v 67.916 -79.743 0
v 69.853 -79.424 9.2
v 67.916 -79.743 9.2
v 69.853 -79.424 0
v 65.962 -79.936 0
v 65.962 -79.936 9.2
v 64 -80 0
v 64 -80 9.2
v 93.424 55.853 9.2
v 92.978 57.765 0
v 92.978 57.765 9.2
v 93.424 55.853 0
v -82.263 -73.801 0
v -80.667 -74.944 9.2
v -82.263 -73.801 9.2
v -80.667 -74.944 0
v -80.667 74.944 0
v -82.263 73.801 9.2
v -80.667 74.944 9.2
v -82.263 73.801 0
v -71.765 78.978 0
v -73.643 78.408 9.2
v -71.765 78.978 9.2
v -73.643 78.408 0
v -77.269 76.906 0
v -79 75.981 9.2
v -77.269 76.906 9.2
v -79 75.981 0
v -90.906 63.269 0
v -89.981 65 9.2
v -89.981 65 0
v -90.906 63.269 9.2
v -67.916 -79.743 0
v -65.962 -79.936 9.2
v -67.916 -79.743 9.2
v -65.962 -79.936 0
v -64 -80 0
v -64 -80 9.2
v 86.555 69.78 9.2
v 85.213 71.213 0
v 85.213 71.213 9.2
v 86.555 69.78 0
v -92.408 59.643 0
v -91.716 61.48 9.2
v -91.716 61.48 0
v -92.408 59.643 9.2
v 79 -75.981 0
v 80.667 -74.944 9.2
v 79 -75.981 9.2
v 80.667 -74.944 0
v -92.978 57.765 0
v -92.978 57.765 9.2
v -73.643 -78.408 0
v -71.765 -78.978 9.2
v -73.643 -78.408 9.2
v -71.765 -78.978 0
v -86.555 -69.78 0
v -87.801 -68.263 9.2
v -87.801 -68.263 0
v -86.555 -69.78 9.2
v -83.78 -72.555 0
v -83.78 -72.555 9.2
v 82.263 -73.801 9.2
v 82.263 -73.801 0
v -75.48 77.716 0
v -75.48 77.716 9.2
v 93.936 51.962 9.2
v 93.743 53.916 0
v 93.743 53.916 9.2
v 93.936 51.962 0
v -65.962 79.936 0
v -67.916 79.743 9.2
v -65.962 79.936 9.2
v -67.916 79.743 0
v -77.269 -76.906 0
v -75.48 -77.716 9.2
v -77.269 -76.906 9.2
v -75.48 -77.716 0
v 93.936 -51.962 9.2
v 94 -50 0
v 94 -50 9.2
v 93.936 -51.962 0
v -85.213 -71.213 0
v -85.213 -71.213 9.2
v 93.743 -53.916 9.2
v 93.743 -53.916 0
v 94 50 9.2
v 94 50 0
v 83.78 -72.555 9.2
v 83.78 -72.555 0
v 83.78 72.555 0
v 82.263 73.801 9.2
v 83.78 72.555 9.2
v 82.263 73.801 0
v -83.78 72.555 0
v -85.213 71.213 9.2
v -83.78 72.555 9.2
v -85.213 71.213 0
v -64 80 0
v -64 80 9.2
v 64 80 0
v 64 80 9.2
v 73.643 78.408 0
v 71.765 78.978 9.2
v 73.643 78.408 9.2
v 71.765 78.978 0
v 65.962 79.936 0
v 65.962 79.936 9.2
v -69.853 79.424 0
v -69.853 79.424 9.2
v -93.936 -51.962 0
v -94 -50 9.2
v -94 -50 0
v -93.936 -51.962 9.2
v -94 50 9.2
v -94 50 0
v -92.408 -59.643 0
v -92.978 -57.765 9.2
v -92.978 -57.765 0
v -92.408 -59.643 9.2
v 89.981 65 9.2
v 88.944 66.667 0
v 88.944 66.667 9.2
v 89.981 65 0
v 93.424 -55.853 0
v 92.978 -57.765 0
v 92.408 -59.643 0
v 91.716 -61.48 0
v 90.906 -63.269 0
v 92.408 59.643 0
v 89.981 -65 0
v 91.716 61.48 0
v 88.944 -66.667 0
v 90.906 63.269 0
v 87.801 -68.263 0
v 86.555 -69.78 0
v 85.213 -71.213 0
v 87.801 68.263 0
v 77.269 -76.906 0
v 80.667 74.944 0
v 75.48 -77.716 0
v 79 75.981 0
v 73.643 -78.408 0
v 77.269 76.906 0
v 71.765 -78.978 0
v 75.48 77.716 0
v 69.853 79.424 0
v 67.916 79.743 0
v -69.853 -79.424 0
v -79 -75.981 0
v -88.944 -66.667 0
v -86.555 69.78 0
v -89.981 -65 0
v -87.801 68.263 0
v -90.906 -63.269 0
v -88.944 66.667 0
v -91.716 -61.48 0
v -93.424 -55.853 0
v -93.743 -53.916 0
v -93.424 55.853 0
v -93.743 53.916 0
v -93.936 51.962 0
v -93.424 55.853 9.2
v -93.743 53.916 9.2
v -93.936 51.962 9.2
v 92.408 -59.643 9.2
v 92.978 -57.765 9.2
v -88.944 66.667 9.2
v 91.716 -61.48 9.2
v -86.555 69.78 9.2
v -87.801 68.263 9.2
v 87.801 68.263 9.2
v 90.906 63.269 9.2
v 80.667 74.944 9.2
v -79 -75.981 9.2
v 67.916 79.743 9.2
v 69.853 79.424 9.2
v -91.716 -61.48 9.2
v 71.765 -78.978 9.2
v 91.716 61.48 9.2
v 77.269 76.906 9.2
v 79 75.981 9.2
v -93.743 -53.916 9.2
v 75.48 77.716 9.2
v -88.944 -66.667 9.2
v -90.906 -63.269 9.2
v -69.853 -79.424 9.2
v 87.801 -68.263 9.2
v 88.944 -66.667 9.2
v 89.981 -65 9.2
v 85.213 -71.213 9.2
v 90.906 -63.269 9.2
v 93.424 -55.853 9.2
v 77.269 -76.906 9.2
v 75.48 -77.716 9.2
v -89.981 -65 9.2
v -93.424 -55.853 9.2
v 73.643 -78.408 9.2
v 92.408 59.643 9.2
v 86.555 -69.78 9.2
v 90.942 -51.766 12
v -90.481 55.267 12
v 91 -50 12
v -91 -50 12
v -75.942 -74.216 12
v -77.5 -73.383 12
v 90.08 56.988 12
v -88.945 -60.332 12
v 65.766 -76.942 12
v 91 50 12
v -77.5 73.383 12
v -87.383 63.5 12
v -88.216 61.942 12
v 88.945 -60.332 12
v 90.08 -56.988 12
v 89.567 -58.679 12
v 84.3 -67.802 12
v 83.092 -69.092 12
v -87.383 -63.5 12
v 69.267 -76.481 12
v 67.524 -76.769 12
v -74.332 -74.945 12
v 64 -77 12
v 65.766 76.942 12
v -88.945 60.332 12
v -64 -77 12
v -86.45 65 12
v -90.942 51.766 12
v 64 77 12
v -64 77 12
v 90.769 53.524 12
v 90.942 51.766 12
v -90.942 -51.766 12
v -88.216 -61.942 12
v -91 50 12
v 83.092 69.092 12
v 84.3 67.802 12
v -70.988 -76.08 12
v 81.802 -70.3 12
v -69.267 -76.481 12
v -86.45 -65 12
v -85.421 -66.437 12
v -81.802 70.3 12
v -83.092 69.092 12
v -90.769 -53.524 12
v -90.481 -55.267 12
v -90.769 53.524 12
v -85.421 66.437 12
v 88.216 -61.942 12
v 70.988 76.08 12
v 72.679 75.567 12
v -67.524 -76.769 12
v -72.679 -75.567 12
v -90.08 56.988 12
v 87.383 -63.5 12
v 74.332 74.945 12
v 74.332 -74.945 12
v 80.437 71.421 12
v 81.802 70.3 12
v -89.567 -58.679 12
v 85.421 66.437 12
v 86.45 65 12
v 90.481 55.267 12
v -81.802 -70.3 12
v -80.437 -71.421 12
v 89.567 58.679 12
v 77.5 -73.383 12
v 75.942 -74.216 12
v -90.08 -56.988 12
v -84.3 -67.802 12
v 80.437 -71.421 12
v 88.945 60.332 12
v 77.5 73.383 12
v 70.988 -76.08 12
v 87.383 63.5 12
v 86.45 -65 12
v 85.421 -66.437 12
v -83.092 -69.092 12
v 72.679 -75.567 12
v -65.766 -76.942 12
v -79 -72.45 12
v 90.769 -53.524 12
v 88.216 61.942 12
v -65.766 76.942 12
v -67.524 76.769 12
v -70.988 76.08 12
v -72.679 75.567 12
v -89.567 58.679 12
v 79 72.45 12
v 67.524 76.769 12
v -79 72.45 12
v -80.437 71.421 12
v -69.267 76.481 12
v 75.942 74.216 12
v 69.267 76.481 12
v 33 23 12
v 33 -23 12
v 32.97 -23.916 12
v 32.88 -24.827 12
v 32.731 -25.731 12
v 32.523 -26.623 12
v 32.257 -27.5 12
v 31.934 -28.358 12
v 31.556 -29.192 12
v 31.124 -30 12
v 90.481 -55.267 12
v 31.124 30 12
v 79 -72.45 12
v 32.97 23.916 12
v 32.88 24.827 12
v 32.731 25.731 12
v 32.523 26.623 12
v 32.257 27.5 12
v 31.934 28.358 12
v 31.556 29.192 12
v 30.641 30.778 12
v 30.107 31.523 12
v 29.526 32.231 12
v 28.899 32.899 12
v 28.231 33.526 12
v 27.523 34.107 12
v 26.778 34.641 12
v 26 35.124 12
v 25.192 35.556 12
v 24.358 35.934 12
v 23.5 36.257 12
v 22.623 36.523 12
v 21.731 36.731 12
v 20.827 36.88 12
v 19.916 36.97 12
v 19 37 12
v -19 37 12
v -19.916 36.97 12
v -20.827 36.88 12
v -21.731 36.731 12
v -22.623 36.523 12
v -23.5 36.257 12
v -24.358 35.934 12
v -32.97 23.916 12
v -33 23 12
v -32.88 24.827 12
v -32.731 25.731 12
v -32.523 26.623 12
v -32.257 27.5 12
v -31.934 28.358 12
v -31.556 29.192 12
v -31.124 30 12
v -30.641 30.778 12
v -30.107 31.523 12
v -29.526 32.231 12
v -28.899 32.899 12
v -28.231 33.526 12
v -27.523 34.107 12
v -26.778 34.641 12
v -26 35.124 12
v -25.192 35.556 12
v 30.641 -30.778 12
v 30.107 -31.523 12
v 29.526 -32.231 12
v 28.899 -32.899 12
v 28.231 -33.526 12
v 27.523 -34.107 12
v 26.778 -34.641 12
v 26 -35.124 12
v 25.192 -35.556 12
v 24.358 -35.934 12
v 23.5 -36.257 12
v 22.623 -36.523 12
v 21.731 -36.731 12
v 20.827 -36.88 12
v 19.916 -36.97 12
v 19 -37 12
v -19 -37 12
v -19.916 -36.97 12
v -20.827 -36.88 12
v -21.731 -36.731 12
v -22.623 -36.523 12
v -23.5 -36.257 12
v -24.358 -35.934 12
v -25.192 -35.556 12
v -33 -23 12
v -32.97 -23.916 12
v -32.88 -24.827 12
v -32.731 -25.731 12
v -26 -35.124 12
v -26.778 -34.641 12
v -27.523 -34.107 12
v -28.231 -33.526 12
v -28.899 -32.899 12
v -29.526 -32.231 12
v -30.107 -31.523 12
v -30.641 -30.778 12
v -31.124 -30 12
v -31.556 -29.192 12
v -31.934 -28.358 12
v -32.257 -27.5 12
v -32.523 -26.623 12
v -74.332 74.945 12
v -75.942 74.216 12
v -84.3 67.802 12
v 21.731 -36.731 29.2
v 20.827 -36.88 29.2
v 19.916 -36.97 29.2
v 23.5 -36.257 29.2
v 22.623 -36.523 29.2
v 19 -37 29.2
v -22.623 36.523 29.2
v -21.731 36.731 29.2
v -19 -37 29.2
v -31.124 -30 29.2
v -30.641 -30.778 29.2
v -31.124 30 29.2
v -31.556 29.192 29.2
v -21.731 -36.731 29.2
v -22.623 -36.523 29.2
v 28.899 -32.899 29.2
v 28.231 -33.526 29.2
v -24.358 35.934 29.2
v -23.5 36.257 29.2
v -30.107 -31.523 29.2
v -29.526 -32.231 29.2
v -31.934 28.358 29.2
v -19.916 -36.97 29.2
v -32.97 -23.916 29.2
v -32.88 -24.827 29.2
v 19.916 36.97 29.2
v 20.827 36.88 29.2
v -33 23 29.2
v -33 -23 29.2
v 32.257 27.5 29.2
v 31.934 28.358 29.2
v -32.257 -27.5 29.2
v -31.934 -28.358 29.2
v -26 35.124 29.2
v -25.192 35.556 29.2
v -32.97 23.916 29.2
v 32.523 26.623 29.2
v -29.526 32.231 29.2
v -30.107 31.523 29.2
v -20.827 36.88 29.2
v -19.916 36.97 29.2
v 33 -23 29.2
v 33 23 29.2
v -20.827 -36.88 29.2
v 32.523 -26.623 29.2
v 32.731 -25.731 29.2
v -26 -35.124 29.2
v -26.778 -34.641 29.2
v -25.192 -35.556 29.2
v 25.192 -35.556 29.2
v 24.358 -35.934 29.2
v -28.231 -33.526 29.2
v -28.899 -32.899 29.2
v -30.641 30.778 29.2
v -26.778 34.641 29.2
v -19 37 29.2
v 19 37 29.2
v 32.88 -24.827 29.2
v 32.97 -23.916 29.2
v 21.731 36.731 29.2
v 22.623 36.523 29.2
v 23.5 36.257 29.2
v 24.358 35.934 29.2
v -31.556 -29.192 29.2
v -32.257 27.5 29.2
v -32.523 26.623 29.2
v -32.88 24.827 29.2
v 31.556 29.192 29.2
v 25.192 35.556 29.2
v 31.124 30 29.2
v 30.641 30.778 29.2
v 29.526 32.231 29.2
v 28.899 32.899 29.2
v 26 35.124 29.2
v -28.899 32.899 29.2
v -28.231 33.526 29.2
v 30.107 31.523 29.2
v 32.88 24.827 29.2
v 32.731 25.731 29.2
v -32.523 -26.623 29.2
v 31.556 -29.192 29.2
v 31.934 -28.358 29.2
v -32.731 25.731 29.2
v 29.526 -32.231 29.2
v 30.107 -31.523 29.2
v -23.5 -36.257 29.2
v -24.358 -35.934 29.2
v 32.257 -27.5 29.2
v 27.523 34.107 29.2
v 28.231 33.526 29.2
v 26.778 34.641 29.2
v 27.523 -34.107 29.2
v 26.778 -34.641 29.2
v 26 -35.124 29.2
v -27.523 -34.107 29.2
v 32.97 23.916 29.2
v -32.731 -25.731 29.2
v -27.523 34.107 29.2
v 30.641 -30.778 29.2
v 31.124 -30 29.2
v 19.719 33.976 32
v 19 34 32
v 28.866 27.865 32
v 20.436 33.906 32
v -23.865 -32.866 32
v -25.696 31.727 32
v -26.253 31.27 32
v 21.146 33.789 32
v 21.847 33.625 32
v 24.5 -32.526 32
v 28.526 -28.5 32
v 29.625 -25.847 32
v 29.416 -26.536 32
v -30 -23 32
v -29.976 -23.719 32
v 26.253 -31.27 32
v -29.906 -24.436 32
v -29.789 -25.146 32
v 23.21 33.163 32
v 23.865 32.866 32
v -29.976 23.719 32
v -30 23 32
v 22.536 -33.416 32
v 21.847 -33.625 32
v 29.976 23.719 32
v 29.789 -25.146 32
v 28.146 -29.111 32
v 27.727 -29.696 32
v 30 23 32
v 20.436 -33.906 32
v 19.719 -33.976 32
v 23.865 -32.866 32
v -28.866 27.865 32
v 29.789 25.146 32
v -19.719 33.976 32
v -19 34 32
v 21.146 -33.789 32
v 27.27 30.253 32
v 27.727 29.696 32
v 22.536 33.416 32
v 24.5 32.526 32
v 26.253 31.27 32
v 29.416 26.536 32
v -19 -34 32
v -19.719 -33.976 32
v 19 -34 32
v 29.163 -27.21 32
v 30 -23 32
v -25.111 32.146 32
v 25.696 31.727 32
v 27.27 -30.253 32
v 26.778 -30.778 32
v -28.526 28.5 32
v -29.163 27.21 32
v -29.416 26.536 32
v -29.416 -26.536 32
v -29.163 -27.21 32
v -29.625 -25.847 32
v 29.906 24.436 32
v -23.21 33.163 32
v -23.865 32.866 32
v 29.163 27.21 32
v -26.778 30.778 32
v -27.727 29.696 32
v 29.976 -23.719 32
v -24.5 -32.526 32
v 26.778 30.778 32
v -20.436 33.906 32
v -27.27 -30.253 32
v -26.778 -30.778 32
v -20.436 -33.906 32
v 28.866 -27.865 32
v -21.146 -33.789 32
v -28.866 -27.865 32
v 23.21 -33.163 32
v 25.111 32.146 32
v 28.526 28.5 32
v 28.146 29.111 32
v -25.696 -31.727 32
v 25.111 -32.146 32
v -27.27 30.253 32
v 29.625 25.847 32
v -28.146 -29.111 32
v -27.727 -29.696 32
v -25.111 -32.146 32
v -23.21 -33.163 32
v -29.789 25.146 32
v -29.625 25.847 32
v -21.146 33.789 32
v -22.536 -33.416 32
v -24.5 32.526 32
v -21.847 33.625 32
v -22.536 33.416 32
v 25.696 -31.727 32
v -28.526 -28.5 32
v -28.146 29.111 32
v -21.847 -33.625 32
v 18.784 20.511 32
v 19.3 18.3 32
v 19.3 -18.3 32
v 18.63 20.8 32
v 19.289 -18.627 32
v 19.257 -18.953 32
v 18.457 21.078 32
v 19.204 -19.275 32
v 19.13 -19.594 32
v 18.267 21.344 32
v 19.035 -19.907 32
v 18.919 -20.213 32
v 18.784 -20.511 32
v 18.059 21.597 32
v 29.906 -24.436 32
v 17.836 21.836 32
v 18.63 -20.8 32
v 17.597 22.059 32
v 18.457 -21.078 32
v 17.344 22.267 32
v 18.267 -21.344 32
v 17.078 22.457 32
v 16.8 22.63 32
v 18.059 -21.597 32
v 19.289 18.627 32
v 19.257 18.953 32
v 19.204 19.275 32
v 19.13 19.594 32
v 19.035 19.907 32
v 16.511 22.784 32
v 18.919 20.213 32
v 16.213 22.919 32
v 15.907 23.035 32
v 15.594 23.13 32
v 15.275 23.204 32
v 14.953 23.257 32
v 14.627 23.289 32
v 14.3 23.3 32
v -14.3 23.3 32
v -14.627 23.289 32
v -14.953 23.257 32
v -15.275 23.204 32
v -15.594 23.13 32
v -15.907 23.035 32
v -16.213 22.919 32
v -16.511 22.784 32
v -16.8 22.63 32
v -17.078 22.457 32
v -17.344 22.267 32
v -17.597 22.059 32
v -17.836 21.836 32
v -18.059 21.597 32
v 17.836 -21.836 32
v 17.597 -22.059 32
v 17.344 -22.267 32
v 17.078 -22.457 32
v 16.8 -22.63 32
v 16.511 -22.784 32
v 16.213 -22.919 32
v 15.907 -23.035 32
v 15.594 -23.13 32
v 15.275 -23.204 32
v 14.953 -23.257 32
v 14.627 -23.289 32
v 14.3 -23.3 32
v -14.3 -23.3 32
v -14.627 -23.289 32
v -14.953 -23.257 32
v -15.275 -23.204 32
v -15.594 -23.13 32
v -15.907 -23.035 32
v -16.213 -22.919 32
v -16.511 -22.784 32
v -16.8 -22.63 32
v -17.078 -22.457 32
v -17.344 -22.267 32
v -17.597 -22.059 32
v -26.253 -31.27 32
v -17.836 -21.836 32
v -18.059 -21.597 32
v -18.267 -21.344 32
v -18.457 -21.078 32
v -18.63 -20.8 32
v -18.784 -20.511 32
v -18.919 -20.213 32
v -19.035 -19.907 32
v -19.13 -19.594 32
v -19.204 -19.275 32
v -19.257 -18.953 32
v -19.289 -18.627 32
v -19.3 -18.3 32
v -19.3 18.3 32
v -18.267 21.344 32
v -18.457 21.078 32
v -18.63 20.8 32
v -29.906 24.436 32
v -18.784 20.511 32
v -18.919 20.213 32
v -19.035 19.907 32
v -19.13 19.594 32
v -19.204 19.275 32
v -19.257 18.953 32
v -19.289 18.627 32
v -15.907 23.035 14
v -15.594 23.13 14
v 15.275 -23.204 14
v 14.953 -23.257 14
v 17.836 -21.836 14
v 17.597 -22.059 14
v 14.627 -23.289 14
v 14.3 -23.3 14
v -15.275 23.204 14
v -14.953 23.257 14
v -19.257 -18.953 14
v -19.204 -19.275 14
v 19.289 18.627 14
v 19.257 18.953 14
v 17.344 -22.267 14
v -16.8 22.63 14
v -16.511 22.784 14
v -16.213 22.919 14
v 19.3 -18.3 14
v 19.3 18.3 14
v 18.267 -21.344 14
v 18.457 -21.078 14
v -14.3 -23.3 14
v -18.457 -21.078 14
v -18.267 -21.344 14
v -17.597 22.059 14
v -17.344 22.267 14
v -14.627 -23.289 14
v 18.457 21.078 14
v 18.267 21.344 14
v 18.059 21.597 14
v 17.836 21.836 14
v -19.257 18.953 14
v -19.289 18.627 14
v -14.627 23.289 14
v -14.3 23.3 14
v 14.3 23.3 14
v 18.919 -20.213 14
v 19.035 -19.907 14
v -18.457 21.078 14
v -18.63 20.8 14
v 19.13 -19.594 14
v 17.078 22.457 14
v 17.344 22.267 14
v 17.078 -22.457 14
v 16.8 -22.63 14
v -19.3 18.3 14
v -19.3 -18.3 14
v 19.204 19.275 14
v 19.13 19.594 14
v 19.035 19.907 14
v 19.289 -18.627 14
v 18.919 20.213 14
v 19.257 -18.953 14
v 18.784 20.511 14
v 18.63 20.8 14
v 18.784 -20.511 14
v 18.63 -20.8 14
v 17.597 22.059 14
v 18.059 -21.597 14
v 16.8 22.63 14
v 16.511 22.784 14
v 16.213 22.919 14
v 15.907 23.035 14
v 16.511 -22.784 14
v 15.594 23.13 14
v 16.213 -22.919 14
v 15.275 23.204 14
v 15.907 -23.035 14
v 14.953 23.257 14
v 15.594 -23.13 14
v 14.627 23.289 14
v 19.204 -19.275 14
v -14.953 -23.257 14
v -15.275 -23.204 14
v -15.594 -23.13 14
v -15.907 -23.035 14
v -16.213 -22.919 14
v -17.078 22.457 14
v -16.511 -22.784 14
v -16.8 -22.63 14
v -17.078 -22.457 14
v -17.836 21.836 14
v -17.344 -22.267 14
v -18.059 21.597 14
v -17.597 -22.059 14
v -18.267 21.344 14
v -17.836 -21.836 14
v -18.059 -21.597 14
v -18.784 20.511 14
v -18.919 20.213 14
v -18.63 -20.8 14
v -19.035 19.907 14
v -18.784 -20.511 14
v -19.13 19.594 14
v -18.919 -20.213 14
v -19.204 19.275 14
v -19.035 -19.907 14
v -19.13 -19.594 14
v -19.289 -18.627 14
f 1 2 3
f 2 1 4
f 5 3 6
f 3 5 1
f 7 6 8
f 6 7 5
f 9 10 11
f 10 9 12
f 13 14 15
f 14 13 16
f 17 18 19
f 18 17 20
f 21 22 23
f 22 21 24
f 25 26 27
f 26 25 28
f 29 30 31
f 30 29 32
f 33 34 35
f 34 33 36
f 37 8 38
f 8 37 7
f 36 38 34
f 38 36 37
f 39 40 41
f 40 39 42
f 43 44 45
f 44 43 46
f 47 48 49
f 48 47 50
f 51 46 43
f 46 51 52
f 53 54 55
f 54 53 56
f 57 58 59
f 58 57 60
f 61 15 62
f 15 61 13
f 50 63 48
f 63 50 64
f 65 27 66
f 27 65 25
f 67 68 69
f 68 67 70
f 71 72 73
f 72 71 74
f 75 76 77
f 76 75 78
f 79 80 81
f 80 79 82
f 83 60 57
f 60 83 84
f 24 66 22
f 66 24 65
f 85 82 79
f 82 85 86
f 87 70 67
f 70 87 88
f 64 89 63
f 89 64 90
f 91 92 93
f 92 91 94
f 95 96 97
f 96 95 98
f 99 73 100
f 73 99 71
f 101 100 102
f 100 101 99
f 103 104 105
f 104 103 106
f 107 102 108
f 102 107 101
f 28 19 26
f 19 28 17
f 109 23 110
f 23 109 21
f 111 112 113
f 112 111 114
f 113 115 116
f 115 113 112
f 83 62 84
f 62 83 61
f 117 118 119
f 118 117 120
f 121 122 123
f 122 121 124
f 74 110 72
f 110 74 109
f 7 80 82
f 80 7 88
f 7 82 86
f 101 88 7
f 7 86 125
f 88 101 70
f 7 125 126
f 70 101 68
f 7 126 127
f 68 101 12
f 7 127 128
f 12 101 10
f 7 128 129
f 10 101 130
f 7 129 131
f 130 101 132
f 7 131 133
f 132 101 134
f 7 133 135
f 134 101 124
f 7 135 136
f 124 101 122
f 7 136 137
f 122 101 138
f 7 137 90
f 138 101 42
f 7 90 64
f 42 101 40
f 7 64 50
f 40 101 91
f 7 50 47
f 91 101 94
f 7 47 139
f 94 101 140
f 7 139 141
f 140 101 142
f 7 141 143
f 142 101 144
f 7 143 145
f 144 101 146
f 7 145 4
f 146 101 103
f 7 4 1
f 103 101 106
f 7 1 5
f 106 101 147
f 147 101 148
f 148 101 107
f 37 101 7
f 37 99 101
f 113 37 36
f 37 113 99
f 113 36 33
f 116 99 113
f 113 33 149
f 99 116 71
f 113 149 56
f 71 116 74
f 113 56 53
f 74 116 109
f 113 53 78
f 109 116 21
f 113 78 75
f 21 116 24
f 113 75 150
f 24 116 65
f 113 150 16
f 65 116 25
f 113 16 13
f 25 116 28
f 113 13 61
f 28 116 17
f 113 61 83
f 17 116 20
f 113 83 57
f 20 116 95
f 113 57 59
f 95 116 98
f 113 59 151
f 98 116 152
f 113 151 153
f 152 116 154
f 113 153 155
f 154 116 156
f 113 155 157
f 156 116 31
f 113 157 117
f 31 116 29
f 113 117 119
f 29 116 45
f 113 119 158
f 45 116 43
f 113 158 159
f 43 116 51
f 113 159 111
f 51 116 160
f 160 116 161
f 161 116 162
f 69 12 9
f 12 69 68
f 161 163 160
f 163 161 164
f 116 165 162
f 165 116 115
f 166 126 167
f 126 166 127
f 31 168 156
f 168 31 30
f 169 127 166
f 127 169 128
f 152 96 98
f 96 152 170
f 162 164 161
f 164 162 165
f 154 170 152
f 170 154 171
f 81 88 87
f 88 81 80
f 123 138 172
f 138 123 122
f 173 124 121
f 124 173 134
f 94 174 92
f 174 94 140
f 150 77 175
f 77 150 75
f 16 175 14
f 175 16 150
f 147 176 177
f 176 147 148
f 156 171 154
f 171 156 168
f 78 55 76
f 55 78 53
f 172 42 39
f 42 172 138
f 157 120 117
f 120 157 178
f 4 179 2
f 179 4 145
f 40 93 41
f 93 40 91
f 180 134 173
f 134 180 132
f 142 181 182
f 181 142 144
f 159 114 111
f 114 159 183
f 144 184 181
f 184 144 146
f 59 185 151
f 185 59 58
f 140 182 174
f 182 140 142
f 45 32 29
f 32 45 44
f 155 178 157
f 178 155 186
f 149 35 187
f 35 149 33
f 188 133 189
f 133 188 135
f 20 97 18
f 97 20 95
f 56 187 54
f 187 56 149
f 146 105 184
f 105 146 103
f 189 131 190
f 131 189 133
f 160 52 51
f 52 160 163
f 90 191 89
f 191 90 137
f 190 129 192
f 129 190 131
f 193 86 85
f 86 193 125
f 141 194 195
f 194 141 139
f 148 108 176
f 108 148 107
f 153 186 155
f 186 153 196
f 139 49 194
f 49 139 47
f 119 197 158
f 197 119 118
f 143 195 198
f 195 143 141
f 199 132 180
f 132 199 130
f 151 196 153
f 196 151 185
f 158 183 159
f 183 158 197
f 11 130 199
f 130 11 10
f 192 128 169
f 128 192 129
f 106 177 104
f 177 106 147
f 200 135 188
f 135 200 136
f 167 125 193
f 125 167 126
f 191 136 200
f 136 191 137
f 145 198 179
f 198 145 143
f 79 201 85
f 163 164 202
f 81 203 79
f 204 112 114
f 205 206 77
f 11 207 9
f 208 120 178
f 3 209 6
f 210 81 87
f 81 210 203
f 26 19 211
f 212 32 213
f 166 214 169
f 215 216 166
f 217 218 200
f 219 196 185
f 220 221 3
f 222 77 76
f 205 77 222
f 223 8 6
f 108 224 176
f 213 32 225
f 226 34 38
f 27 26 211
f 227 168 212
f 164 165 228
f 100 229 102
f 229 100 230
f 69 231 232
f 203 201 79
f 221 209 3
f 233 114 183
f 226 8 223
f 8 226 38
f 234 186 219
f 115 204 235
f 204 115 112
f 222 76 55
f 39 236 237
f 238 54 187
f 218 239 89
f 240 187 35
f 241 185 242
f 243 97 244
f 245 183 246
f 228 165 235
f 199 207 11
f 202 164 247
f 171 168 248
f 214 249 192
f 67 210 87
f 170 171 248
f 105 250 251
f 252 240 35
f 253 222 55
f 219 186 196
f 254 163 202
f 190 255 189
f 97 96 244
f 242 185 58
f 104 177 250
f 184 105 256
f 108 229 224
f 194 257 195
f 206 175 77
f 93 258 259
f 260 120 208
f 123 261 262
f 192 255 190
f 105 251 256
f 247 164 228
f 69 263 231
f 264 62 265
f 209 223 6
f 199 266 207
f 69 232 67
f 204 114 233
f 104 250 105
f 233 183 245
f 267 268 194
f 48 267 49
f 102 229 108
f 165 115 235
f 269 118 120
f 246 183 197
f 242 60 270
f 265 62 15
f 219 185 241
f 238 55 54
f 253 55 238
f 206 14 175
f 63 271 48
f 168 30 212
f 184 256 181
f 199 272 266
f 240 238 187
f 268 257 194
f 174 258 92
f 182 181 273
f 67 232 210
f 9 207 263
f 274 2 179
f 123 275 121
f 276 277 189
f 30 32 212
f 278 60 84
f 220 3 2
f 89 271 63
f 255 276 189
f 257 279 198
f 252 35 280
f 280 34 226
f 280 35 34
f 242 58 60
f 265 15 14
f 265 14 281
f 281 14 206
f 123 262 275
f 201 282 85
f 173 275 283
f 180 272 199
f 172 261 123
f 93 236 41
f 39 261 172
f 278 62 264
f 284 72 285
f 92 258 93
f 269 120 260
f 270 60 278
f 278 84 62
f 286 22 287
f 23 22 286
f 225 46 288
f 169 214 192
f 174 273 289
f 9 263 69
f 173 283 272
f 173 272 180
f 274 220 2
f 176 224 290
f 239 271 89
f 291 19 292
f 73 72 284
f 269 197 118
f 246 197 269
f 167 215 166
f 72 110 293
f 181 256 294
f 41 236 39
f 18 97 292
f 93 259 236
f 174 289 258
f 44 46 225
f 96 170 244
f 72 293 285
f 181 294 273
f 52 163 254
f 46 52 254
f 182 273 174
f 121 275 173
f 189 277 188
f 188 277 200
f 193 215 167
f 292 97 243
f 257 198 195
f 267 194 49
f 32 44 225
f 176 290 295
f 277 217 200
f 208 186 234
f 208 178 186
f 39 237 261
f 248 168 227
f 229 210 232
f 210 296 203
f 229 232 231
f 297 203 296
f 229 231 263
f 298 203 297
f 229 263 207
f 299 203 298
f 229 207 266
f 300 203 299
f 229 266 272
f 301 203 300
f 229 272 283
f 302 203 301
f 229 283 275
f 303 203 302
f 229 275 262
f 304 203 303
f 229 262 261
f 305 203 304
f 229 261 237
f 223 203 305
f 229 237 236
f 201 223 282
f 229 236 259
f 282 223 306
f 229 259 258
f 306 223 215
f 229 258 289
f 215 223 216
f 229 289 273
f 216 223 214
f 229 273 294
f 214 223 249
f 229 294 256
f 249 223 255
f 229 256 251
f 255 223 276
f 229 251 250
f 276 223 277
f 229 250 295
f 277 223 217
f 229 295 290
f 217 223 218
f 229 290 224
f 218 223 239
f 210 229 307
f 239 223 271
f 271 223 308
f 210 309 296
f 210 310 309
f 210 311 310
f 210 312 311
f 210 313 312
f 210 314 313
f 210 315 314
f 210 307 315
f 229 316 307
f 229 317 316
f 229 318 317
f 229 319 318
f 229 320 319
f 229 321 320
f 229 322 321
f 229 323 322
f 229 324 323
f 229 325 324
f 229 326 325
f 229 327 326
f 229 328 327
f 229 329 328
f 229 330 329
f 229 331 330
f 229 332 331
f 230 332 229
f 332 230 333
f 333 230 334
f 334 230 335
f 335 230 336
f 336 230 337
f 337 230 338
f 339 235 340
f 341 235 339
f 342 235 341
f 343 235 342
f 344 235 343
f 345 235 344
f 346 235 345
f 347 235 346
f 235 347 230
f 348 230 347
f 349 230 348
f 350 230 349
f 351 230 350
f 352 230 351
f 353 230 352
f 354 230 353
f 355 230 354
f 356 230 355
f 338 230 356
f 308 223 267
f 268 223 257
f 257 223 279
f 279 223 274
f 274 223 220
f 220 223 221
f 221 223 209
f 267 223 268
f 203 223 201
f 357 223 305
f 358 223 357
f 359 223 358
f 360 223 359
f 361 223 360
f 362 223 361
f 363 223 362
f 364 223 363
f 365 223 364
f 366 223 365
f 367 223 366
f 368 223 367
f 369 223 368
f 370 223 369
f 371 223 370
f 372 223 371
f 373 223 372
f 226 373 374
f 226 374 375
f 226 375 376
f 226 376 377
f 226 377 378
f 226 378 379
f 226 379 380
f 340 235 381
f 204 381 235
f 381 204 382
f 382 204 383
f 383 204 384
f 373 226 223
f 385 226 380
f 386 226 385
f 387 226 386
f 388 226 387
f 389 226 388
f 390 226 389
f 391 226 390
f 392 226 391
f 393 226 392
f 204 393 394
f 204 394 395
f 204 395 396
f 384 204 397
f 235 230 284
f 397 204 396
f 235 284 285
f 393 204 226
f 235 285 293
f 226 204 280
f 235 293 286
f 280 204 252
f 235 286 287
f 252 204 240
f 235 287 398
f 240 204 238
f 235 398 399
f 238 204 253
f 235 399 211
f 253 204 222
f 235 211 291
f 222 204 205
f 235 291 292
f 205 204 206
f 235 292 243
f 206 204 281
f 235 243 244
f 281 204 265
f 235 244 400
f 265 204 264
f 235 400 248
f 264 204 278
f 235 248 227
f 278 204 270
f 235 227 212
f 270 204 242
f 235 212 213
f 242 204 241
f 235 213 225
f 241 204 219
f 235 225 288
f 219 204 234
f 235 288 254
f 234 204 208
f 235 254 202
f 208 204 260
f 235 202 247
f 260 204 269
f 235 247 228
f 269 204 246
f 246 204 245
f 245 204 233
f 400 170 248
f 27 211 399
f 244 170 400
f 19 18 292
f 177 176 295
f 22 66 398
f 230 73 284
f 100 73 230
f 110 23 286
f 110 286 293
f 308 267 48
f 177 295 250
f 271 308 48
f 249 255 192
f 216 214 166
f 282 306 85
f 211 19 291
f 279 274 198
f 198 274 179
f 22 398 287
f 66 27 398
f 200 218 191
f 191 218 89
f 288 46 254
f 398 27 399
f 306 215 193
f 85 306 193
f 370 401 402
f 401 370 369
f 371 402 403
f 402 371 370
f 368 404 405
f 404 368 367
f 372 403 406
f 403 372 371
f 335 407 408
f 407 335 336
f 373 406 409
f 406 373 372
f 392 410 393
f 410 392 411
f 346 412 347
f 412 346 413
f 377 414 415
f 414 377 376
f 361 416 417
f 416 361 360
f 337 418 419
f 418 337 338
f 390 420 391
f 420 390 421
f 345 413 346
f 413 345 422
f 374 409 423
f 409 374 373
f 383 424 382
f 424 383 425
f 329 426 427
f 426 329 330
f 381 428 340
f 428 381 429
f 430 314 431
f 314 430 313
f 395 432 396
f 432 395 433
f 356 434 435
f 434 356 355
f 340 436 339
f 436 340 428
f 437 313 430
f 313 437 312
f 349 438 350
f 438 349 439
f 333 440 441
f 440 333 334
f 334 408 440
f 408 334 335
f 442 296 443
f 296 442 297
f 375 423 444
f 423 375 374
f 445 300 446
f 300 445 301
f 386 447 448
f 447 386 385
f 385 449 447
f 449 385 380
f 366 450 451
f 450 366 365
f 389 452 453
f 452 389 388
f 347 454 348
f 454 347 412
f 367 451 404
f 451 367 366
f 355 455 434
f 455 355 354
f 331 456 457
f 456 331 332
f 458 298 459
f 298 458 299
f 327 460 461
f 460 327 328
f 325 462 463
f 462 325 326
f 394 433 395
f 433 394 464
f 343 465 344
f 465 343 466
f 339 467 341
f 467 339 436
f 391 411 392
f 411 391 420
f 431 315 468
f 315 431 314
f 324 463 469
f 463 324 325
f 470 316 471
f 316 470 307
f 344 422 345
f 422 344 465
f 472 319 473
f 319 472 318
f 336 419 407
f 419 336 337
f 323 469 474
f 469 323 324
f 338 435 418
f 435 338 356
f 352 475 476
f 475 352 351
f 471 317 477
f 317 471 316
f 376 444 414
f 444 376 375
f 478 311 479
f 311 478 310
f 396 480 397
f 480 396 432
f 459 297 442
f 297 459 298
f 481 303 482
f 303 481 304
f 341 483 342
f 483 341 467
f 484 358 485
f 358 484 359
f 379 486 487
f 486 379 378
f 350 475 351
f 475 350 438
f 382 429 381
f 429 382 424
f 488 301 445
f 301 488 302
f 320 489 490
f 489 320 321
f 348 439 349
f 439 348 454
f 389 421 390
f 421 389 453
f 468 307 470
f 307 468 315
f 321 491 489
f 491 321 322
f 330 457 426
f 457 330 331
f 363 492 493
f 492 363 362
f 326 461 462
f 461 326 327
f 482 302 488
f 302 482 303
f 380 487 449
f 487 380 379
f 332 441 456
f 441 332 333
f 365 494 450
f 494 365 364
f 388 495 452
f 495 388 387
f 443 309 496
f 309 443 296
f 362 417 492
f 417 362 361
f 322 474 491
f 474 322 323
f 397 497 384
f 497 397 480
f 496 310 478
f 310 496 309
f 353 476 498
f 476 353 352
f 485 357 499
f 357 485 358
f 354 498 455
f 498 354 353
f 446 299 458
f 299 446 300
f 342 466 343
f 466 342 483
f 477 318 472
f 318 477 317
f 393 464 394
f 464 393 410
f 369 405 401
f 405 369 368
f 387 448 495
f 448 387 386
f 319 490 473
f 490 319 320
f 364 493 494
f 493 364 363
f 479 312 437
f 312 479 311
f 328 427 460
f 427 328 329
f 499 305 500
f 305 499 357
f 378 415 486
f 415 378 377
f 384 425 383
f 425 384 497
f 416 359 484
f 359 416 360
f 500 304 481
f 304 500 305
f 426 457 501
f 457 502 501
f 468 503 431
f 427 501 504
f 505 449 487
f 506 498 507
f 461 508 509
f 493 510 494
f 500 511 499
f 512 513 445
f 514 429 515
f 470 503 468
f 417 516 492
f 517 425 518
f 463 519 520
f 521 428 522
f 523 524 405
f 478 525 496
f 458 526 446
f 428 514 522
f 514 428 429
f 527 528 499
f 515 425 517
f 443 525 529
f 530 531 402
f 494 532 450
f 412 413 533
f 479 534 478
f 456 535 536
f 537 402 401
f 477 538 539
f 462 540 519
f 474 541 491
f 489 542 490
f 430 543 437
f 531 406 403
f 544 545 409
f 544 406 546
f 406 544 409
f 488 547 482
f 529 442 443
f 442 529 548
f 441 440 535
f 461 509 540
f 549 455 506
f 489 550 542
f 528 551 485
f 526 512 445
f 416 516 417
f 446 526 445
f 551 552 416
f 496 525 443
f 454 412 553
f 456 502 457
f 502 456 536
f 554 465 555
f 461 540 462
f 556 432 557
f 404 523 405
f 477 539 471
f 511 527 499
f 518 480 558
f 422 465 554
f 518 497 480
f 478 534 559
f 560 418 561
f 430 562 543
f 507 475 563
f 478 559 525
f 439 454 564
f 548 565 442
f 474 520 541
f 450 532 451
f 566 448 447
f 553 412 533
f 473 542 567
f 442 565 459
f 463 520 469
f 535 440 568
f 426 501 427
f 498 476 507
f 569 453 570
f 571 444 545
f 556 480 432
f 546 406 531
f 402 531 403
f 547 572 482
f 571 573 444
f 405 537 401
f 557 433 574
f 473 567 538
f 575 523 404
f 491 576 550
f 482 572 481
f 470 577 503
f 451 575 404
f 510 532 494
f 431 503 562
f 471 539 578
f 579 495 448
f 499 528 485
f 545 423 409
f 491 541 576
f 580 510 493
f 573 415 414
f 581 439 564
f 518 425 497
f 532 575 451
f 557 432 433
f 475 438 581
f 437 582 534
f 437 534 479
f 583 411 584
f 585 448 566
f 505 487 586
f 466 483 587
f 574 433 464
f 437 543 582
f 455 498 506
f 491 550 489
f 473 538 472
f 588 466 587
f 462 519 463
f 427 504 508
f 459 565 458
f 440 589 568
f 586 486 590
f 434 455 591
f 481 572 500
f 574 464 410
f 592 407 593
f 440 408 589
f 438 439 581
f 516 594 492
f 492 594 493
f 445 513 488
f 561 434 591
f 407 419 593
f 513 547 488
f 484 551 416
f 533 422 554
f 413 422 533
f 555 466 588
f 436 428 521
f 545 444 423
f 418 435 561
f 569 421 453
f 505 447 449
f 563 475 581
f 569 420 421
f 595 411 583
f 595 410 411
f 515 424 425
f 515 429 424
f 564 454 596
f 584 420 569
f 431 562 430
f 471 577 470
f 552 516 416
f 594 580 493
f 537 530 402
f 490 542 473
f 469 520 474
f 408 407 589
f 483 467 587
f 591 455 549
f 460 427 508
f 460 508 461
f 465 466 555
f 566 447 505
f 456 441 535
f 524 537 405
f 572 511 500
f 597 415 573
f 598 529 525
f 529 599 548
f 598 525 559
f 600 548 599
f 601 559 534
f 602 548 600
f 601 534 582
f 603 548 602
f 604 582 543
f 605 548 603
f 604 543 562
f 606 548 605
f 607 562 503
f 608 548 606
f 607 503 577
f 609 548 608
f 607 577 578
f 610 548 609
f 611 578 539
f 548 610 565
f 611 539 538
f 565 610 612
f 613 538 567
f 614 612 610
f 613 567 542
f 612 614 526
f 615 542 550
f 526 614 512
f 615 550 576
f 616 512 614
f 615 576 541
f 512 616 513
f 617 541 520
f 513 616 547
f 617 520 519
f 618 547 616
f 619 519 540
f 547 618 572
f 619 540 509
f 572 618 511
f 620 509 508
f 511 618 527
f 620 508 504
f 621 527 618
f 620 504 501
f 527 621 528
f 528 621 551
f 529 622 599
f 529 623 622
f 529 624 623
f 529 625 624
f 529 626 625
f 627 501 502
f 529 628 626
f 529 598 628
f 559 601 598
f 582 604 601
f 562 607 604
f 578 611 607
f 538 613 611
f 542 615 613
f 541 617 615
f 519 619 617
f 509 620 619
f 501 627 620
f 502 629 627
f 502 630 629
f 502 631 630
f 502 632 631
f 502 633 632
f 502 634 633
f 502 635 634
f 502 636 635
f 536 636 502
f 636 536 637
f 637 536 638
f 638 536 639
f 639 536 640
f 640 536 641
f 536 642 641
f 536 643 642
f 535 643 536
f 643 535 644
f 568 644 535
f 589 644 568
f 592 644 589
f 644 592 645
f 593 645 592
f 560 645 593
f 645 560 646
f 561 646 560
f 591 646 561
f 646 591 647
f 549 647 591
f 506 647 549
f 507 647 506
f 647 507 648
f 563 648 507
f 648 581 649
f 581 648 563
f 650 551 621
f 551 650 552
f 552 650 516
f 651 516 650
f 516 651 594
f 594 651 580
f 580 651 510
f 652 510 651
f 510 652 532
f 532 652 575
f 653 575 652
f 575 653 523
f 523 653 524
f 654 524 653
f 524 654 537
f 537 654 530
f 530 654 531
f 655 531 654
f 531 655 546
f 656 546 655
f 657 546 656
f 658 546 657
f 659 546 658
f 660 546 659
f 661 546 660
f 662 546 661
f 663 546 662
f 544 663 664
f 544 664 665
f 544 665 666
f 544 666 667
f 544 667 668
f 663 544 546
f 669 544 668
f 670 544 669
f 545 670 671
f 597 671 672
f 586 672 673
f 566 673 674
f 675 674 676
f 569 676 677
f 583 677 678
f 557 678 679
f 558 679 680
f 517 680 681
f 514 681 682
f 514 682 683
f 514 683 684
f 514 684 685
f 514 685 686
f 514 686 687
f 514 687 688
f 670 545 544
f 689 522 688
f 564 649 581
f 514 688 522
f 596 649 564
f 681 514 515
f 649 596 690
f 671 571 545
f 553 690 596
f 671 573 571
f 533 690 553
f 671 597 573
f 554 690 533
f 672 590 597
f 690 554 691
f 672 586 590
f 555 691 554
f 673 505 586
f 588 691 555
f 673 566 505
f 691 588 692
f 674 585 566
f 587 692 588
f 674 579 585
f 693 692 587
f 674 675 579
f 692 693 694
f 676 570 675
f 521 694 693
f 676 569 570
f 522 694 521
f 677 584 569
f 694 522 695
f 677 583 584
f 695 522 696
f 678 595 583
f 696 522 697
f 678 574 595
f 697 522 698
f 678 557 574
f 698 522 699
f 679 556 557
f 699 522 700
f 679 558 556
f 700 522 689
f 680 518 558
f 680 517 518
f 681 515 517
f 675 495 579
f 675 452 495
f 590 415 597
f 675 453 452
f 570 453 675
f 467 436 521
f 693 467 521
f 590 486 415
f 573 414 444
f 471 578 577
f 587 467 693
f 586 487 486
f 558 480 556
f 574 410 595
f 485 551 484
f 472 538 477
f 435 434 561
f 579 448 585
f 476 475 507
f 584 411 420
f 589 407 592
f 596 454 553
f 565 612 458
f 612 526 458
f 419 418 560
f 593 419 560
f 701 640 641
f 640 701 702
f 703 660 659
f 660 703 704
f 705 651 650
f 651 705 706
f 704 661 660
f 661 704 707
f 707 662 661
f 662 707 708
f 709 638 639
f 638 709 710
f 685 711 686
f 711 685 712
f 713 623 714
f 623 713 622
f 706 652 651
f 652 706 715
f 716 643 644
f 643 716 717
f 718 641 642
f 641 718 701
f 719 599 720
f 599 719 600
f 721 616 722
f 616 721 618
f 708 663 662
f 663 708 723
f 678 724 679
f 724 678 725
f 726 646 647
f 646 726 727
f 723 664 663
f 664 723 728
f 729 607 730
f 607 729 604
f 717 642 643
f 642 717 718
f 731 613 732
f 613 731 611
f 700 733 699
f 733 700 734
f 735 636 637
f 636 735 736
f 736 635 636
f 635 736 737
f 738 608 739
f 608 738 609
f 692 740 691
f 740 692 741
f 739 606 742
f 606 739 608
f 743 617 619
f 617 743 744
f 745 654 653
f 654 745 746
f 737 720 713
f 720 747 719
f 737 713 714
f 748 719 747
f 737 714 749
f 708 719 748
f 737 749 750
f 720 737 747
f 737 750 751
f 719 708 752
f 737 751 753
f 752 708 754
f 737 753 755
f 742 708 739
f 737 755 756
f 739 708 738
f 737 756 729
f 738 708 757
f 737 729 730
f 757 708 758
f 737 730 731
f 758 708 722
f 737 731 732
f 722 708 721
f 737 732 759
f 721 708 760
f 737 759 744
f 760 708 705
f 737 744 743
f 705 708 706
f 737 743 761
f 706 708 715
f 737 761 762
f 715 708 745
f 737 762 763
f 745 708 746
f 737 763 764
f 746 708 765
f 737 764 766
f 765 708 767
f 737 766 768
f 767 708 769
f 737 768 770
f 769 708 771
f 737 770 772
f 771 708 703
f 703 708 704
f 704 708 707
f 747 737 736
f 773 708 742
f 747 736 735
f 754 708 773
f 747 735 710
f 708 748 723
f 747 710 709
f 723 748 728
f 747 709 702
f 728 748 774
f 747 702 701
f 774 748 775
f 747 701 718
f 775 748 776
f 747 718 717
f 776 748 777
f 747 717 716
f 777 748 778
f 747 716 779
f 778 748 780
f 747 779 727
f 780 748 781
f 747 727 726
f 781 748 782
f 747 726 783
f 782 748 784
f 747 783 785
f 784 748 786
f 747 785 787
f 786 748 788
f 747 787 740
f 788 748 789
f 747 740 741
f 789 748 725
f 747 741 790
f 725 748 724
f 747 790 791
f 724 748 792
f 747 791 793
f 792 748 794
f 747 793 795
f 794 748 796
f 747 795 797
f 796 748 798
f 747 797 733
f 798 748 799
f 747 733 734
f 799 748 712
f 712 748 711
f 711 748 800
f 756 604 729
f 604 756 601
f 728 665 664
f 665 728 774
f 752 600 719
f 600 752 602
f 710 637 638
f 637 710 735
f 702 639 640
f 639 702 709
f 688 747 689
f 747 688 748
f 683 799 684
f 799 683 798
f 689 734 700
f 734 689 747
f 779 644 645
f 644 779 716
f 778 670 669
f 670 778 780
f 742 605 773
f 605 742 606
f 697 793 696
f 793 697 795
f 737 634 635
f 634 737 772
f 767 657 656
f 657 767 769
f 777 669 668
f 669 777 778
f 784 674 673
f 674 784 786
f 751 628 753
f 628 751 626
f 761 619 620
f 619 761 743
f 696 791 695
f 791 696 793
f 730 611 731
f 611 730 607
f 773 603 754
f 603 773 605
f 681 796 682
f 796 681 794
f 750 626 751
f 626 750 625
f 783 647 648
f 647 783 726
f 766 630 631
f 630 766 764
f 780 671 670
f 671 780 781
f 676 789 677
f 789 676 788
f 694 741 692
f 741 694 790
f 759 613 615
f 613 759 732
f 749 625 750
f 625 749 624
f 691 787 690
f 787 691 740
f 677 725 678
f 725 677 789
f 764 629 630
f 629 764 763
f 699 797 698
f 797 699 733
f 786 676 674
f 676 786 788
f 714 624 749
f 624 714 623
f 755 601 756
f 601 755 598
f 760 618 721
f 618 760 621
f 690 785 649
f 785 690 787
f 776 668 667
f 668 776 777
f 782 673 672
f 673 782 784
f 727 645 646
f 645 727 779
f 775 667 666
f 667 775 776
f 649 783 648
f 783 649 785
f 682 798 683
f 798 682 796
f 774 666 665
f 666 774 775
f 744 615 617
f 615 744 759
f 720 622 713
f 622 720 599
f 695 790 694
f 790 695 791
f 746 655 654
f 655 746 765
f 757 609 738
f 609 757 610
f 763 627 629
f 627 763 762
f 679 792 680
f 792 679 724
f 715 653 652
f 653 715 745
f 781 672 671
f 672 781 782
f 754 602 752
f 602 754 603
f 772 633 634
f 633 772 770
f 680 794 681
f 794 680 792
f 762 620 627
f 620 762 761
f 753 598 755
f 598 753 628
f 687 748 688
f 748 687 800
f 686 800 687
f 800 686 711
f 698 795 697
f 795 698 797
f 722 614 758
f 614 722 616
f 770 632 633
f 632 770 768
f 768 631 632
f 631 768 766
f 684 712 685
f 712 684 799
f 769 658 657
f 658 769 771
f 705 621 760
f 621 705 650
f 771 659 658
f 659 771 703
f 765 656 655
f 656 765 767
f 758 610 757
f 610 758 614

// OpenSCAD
// Headphone stand in three printable parts: base, post, hanger.
// No glue, no screws. Rectangular (non-round) blade tenons prevent spinning.
// All dimensions in mm. Print orientation is the exported orientation (+Z up).
//
// Assembly heights (assembly coordinates, desk at z=0):
//   base plate/boss top        0 .. 32
//   post                       14.5 .. 250  (17.5 mm of it inside the base socket)
//   hanger tenon               228.5 .. 250 (21.5 mm inside the post socket)
//   hanger saddle top centre   270
// Socket clearances: 0.3 mm per side (socket is tenon + 0.6 in each dimension),
// tenon tips stop 0.5 mm above socket floors; shoulders/faces give the depth stop
// for the hanger, and the post bottoms in its socket.

part = "base"; // [base, post, hanger, assembly]
cadverify_only = "";

$fn = 96;

/* [Base] */
base_w = 188;          // desk footprint, X
base_d = 160;          // desk footprint, Y
base_plate_top = 9;    // straight plate wall up to here, then 45 deg chamfer to 12
base_top_plate = 12;
boss_w = 66;
boss_d = 74;
boss_straight_top = 29; // then 45 deg chamfer to boss_top
boss_top = 32;
base_socket_w = 38.6;  // post 38 + 0.6
base_socket_d = 46.6;  // post 46 + 0.6
base_socket_floor = 14;

/* [Post] */
post_w = 38;
post_d = 46;
post_len = 235.5;      // tip (local z=0) to top (assembly 250)
post_top_socket_w = 24.6; // hanger tenon 24 + 0.6
post_top_socket_d = 34.6; // hanger tenon 34 + 0.6
post_top_socket_floor_local = 213.5; // assembly 228

/* [Hanger, modelled in print coordinates] */
// Print coordinates: X = saddle length, Y = height above tenon tip,
// Z = saddle width direction (part lies on its Z=0 side face on the bed).
hang_len_half = 69;    // overall saddle half length incl. rounded end point
hang_width = 34;       // >= 30 mm headband support width
hang_top_rel = 41.5;   // tenon tip to saddle crown; assembly 228.5 + 41.5 = 270
hang_arc_r = 170;      // crown radius of the headband contact surface
hang_plate_t = 10;     // saddle plate thickness (vertical, in profile)
hang_tenon_half_w = 12;  // tenon is 24 (X) x 34 (width)
hang_shoulder_rel = 21.5; // assembly 250, post top
hang_neck_half_w = 17;

function hang_top_z(x) = hang_top_rel - (hang_arc_r - sqrt(hang_arc_r*hang_arc_r - x*x));
function hang_bot_z(x) = hang_top_z(x) - hang_plate_t;

module rounded_rect(w, d, r) {
    offset(r = r) square([w - 2*r, d - 2*r], center = true);
}

module instance(name, part_name, unit = 1) {
    echo(cadverify_instance = [name, part_name, unit]);
    if (cadverify_only == "" || cadverify_only == name) children();
}

/* ---------- BASE (print = assembly orientation) ---------- */
module base_part() {
    difference() {
        // Outer corners of the plate and boss are rounded in plan view (corner
        // radius >= 6 mm) and the top rims have 45 deg x 3 mm chamfers, so
        // nothing sticks out beyond the bounding box or the support plane.
        union() {
            // desk plate with 45 deg top edge chamfer
            linear_extrude(base_plate_top) rounded_rect(base_w, base_d, 30);
            hull() {
                translate([0, 0, base_plate_top]) linear_extrude(0.2)
                    rounded_rect(base_w, base_d, 30);
                translate([0, 0, base_top_plate - 0.2]) linear_extrude(0.2)
                    rounded_rect(base_w - 6, base_d - 6, 27);
            }
            // raised boss / collar around the post socket, 45 deg top chamfer
            translate([0, 0, base_top_plate])
                linear_extrude(boss_straight_top - base_top_plate)
                    rounded_rect(boss_w, boss_d, 14);
            hull() {
                translate([0, 0, boss_straight_top]) linear_extrude(0.2)
                    rounded_rect(boss_w, boss_d, 14);
                translate([0, 0, boss_top - 0.2]) linear_extrude(0.2)
                    rounded_rect(boss_w - 6, boss_d - 6, 11);
            }
        }
        // blind rectangular socket for the post (stops post spinning)
        translate([0, 0, base_socket_floor])
            linear_extrude(boss_top - base_socket_floor + 2)
                rounded_rect(base_socket_w, base_socket_d, 5);
    }
}

/* ---------- POST (printed upright, local z=0 is tenon tip) ---------- */
module post_part() {
    difference() {
        // Solid rectangular column, corners rounded 8 mm in plan view.
        linear_extrude(post_len) rounded_rect(post_w, post_d, 8);
        // Blind rectangular socket in the top for the hanger blade tenon:
        // tenon + 0.6 mm per side (0.3 mm clearance); the non-round rectangle
        // is what stops the hanger spinning on the post.
        translate([0, 0, post_top_socket_floor_local])
            linear_extrude(post_len - post_top_socket_floor_local + 2)
                rounded_rect(post_top_socket_w, post_top_socket_d, 5);
    }
}

/* ---------- HANGER (printed on its side) ---------- */
module hanger_part() {
    top_pts    = [for (x = [56 : -8 : -56]) [x, hang_top_z(x)]];
    bot_r_pts  = [for (x = [48 : 8 : 64]) [x, hang_bot_z(x)]];
    bot_l_pts  = [for (x = [-64 : 8 : -48]) [x, hang_bot_z(x)]];
    mid64 = (hang_top_z(64) + hang_bot_z(64)) / 2;
    // Saddle/neck profile above the shoulder plane (print y = hang_shoulder_rel).
    profile = concat(
        [[-hang_neck_half_w, hang_shoulder_rel], [hang_neck_half_w, hang_shoulder_rel],
         [30, hang_bot_z(30)]],
        bot_r_pts,
        [[hang_len_half - 0.5, mid64], [64, hang_top_z(64)]],
        top_pts,
        [[-64, hang_top_z(64)], [-(hang_len_half - 0.5), mid64], [-64, hang_bot_z(64)]],
        bot_l_pts,
        [[-30, hang_bot_z(30)]]
    );
    difference() {
        union() {
            linear_extrude(hang_width) polygon(profile);
            // Blade tenon below the shoulder: 24 x 34 with 3 mm 45 deg corner
            // chamfers (not radii, so no near-horizontal surface floats above
            // the bed-side face when printed on its side). It clears the post
            // socket's 5 mm rounded corners and reaches 2 mm up into the neck
            // so the union is volumetric, not face-only.
            translate([0, 0, hang_width/2]) rotate([-90, 0, 0])
                linear_extrude(hang_shoulder_rel + 2)
                    polygon([[-9, -17], [9, -17], [12, -14], [12, 14],
                             [9, 17], [-9, 17], [-12, 14], [-12, -14]]);
        }
        // 45 deg chamfers on the two crown side edges, limited to the central
        // contact zone |x| <= 36. Each box is the half-space beyond its
        // chamfer plane, rotated -45 deg about X from an origin on the plane:
        //   far side keeps Y + Z <= hang_top_z(36) + hang_width
        //   bed side keeps Y - Z <= hang_top_z(36)
        // At |x| = 36 the crown meets the plane, so beyond it the plate keeps
        // its full 34 mm width; at the centre the chamfers leave a ~30.7 mm
        // flat crown. The bed-side chamfer face itself is exactly 45 deg.
        translate([0, hang_top_z(36), hang_width]) rotate([-45, 0, 0])
            translate([-36, 0, 0]) cube([72, 40, 40]);
        translate([0, hang_top_z(36), 0]) rotate([-45, 0, 0])
            translate([-36, 0, 0]) cube([72, 40, 40]);
    }
}

/* ---------- Spec echoes ---------- */
if (part == "base") {
    echo(cadverify_spec = [
        ["bounds", [[-base_w/2, -base_d/2, 0], [base_w/2, base_d/2, boss_top]]],
        ["bodies", 1],
        ["through_holes", 0],
        ["support_faces", [["desk", "-z", 25000]]],
        ["overhangs_allowed", []],
        ["copies", 1],
        ["details", [
            ["plate", "material", [[-80, -60, 2], [80, 60, 10]], 0.99],
            ["boss_wall", "material", [[22, -30, 16], [31, 30, 28]], 0.99],
            ["post_socket", "void", [[-17, -21, 16], [17, 21, 30]], 0.99],
            ["socket_floor", "thickness", [0, 0, 42], [0, 0, -1], base_socket_floor],
            ["boss_socket_top", "view", [[-34, -38, 27], [34, 38, boss_top]]]
        ]]
    ]);
} else if (part == "post") {
    echo(cadverify_spec = [
        ["bounds", [[-post_w/2, -post_d/2, 0], [post_w/2, post_d/2, post_len]]],
        ["bodies", 1],
        ["through_holes", 0],
        ["support_faces", [["bed", "-z", 1500]]],
        ["overhangs_allowed", []],
        ["copies", 1],
        ["details", [
            ["column", "material", [[-16, -20, 30], [16, 20, 200]], 0.99],
            ["hanger_socket", "void", [[-10, -15, 216], [10, 15, 234]], 0.99],
            ["column_width", "thickness", [32, 0, 100], [-1, 0, 0], post_w],
            ["top_socket", "view", [[-19, -23, 210], [19, 23, post_len]]]
        ]]
    ]);
} else if (part == "hanger") {
    // actual extreme points are the saddle end tips at +-(hang_len_half - 0.5)
    echo(cadverify_spec = [
        ["bounds", [[-(hang_len_half - 0.5), 0, 0], [hang_len_half - 0.5, hang_top_rel, hang_width]]],
        ["bodies", 1],
        ["through_holes", 0],
        ["support_faces", [["bed", "-z", 1200]]],
        ["overhangs_allowed", [
            ["45deg crown chamfer on bed side", [[-36, 37, 0], [36, hang_top_rel, 5]]]
        ]],
        ["copies", 1],
        ["details", [
            ["saddle_plate", "material", [[-25, 32, 5], [25, 38, 29]], 0.99],
            ["tenon", "material", [[-10, 2, 5], [10, 20, 29]], 0.99],
            ["saddle_thickness", "thickness", [50, 52, 17], [0, -1, 0], hang_plate_t],
            ["rounded_crown", "view", [[-40, 27, 0], [40, hang_top_rel, hang_width]]]
        ]]
    ]);
} else if (part == "assembly") {
    echo(cadverify_spec = [
        ["bounds", [[-base_w/2, -base_d/2, 0], [base_w/2, base_d/2, 270]]],
        ["support_faces", [["desk", "-z", 25000]]],
        ["allowed_interferences", []],
        ["assembly_order", [
            [["base"], [0, 0, 0]],
            [["post"], [0, 0, -1]],
            [["hanger"], [0, 0, -1]]
        ]]
    ]);
}

/* ---------- Output ---------- */
if (part == "base") {
    base_part();
} else if (part == "post") {
    post_part();
} else if (part == "hanger") {
    hanger_part();
} else if (part == "assembly") {
    instance("base", "base") base_part();
    instance("post", "post") translate([0, 0, 14.5]) post_part();
    // hanger print coords (x, y=height rel. tenon tip, z=width)
    //   -> assembly (x, 17-z, 228.5+y): tenon tip at 228.5, crown at 270
    instance("hanger", "hanger")
        translate([0, hang_width/2, 228.5]) rotate([90, 0, 0]) hanger_part();
} else {
    assert(false, str("unknown part: ", part));
}
